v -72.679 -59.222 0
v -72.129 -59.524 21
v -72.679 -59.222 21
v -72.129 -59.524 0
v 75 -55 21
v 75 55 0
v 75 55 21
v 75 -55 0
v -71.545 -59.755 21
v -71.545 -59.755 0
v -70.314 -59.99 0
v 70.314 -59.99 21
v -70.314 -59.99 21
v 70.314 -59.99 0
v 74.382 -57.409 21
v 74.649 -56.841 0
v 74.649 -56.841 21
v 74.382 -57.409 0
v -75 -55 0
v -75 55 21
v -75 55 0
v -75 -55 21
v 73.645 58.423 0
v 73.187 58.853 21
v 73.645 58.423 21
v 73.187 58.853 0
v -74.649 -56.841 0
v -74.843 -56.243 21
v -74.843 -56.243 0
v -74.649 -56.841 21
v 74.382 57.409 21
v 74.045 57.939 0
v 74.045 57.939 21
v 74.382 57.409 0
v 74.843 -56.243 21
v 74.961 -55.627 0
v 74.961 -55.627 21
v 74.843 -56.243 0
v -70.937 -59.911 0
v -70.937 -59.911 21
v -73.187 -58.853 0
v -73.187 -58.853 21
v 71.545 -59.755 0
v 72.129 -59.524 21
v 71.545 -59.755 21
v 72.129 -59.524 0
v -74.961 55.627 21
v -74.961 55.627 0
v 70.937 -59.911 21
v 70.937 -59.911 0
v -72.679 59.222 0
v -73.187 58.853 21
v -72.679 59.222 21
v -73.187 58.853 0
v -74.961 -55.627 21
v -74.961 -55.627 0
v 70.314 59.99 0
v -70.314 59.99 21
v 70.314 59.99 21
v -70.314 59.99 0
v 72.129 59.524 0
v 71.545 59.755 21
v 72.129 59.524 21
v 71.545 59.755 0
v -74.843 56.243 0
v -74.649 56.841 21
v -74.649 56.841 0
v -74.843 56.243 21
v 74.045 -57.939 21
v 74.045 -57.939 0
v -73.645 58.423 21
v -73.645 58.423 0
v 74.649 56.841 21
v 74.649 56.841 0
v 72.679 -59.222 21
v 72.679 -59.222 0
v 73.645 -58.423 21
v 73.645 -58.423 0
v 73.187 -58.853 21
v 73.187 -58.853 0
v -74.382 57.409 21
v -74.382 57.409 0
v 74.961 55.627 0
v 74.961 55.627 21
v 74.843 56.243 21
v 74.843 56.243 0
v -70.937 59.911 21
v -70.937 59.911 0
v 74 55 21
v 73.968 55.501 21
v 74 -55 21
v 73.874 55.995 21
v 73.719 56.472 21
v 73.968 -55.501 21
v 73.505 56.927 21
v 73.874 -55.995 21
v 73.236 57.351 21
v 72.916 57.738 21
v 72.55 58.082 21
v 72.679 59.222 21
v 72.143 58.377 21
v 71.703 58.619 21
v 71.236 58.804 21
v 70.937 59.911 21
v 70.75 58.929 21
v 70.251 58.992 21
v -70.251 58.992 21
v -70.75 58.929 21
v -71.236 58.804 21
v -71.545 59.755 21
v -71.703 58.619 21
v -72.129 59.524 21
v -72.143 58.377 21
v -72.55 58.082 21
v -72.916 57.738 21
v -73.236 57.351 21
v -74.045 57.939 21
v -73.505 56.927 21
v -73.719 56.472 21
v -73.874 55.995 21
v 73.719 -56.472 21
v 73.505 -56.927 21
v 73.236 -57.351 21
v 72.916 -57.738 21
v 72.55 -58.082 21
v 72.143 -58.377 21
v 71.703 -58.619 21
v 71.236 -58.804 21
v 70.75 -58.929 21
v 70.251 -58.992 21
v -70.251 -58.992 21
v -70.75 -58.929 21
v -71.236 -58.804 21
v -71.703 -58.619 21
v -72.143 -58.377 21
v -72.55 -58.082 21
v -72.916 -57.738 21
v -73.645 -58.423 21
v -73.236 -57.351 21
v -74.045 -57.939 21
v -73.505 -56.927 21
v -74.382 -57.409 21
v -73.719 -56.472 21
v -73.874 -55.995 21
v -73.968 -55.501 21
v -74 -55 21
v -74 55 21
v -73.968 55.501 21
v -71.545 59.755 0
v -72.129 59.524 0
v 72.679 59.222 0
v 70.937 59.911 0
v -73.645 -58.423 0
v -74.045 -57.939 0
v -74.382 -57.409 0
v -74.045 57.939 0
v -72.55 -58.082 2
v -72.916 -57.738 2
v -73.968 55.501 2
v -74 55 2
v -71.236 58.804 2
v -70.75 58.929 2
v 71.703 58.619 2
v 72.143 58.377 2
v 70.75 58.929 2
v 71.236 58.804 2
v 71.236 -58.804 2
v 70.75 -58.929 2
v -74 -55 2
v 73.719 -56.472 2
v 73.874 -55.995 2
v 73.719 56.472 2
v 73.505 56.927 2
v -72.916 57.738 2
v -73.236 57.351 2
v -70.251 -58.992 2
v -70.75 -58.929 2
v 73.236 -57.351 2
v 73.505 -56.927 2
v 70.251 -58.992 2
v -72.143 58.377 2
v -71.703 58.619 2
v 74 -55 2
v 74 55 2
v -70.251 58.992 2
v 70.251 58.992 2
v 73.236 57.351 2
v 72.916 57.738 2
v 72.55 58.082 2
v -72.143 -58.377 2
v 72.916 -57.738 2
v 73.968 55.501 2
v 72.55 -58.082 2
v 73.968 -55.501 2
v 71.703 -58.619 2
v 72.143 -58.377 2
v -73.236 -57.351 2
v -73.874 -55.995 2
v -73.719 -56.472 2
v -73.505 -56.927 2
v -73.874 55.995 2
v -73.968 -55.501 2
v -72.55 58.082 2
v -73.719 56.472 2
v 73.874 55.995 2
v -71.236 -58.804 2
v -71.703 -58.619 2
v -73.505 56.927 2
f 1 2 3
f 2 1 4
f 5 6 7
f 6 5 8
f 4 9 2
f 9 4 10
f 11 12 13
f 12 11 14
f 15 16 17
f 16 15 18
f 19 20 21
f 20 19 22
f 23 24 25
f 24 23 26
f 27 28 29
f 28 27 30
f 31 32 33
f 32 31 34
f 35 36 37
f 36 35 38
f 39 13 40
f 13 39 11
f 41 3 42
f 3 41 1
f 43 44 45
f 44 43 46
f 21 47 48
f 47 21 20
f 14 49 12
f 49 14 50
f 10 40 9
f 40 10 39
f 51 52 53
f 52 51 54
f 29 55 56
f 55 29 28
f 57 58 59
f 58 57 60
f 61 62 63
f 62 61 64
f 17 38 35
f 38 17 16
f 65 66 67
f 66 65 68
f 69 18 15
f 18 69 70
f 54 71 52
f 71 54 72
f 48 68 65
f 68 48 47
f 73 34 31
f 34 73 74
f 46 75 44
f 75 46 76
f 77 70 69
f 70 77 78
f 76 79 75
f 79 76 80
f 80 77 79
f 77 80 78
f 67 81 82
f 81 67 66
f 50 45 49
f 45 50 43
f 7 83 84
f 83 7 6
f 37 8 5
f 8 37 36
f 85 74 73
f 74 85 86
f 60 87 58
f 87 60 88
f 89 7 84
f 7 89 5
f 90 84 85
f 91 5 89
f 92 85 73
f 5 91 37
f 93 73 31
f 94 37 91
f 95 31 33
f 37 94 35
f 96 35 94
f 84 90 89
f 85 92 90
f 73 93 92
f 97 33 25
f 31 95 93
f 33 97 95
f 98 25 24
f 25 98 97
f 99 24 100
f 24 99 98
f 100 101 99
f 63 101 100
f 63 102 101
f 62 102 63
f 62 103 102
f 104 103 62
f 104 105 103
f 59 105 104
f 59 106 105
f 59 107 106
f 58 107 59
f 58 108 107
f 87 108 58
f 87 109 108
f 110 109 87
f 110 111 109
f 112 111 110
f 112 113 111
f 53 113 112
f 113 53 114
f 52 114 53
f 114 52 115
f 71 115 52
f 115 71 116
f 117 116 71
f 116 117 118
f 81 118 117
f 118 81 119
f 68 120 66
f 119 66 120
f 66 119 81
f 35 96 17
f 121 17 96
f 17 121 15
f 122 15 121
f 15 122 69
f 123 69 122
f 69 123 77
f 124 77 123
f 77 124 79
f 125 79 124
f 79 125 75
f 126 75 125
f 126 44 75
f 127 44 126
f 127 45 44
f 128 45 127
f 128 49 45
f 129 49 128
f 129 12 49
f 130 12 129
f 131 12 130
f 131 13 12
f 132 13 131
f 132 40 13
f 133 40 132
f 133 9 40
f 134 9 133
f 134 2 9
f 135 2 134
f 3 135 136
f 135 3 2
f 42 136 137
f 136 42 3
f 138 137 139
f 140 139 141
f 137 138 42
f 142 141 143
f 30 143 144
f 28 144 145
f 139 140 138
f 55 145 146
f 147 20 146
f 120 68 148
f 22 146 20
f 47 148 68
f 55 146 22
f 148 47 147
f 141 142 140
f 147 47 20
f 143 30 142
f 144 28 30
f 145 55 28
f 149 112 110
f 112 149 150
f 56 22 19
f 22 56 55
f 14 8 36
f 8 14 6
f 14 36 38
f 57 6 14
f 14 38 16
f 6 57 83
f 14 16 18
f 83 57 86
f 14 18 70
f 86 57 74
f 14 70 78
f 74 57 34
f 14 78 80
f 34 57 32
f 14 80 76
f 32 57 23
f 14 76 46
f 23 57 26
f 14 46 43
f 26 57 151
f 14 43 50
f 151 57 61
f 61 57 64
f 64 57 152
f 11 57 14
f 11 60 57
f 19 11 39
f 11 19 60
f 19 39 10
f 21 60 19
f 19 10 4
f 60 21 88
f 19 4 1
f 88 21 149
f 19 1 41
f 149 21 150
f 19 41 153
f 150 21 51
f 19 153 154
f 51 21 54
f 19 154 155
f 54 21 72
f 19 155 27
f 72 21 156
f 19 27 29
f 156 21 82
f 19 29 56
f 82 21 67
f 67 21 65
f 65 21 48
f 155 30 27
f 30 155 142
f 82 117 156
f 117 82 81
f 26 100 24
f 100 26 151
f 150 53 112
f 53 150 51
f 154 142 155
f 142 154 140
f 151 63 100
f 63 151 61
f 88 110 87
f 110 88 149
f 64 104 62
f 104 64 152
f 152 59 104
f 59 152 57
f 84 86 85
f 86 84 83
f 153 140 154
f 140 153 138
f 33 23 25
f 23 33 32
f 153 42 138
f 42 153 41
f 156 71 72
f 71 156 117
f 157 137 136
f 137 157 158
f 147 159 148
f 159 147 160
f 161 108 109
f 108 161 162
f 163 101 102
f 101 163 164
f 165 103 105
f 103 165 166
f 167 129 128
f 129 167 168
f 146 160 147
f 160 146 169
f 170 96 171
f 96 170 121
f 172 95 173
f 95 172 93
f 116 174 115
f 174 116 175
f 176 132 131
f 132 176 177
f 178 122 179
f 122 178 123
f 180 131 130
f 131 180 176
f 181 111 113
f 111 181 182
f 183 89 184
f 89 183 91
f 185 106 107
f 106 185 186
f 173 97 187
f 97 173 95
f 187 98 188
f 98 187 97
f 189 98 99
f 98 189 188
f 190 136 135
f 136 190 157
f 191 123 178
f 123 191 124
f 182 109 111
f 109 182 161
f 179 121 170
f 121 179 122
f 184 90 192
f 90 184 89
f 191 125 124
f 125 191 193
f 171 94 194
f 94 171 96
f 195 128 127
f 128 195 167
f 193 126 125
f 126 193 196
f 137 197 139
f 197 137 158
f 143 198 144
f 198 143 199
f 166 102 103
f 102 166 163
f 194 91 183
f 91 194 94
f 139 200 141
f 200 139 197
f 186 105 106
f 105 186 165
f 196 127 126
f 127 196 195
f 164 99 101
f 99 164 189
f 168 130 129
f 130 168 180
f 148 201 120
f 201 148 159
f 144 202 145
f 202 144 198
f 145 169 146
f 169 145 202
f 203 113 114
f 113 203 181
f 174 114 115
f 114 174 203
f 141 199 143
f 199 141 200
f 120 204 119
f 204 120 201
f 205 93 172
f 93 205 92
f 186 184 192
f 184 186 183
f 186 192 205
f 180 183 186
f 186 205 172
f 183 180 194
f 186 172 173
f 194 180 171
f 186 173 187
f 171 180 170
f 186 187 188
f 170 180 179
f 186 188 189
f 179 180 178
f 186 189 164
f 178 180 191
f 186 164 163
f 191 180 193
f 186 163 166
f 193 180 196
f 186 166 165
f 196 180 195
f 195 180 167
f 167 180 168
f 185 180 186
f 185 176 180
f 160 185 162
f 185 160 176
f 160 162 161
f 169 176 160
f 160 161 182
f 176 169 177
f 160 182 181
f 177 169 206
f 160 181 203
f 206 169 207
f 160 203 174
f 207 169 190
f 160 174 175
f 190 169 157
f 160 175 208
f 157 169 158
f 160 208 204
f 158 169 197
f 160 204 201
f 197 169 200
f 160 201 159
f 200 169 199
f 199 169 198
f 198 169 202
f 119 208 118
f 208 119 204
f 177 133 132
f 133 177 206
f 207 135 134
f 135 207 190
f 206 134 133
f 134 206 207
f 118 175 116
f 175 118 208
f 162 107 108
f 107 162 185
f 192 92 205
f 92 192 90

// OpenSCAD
$fn = 50;


difference() {
	union() {
		hull() {
			translate(v = [-70.0000000000, 55.0000000000, 0]) {
				cylinder(h = 21, r = 5);
			}
			translate(v = [70.0000000000, 55.0000000000, 0]) {
				cylinder(h = 21, r = 5);
			}
			translate(v = [-70.0000000000, -55.0000000000, 0]) {
				cylinder(h = 21, r = 5);
			}
			translate(v = [70.0000000000, -55.0000000000, 0]) {
				cylinder(h = 21, r = 5);
			}
		}
	}
	union() {
		translate(v = [0, 0, 2]) {
			hull() {
				translate(v = [-70.0000000000, 55.0000000000, 0]) {
					cylinder(h = 19, r = 4);
				}
				translate(v = [70.0000000000, 55.0000000000, 0]) {
					cylinder(h = 19, r = 4);
				}
				translate(v = [-70.0000000000, -55.0000000000, 0]) {
					cylinder(h = 19, r = 4);
				}
				translate(v = [70.0000000000, -55.0000000000, 0]) {
					cylinder(h = 19, r = 4);
				}
			}
		}
	}
}
